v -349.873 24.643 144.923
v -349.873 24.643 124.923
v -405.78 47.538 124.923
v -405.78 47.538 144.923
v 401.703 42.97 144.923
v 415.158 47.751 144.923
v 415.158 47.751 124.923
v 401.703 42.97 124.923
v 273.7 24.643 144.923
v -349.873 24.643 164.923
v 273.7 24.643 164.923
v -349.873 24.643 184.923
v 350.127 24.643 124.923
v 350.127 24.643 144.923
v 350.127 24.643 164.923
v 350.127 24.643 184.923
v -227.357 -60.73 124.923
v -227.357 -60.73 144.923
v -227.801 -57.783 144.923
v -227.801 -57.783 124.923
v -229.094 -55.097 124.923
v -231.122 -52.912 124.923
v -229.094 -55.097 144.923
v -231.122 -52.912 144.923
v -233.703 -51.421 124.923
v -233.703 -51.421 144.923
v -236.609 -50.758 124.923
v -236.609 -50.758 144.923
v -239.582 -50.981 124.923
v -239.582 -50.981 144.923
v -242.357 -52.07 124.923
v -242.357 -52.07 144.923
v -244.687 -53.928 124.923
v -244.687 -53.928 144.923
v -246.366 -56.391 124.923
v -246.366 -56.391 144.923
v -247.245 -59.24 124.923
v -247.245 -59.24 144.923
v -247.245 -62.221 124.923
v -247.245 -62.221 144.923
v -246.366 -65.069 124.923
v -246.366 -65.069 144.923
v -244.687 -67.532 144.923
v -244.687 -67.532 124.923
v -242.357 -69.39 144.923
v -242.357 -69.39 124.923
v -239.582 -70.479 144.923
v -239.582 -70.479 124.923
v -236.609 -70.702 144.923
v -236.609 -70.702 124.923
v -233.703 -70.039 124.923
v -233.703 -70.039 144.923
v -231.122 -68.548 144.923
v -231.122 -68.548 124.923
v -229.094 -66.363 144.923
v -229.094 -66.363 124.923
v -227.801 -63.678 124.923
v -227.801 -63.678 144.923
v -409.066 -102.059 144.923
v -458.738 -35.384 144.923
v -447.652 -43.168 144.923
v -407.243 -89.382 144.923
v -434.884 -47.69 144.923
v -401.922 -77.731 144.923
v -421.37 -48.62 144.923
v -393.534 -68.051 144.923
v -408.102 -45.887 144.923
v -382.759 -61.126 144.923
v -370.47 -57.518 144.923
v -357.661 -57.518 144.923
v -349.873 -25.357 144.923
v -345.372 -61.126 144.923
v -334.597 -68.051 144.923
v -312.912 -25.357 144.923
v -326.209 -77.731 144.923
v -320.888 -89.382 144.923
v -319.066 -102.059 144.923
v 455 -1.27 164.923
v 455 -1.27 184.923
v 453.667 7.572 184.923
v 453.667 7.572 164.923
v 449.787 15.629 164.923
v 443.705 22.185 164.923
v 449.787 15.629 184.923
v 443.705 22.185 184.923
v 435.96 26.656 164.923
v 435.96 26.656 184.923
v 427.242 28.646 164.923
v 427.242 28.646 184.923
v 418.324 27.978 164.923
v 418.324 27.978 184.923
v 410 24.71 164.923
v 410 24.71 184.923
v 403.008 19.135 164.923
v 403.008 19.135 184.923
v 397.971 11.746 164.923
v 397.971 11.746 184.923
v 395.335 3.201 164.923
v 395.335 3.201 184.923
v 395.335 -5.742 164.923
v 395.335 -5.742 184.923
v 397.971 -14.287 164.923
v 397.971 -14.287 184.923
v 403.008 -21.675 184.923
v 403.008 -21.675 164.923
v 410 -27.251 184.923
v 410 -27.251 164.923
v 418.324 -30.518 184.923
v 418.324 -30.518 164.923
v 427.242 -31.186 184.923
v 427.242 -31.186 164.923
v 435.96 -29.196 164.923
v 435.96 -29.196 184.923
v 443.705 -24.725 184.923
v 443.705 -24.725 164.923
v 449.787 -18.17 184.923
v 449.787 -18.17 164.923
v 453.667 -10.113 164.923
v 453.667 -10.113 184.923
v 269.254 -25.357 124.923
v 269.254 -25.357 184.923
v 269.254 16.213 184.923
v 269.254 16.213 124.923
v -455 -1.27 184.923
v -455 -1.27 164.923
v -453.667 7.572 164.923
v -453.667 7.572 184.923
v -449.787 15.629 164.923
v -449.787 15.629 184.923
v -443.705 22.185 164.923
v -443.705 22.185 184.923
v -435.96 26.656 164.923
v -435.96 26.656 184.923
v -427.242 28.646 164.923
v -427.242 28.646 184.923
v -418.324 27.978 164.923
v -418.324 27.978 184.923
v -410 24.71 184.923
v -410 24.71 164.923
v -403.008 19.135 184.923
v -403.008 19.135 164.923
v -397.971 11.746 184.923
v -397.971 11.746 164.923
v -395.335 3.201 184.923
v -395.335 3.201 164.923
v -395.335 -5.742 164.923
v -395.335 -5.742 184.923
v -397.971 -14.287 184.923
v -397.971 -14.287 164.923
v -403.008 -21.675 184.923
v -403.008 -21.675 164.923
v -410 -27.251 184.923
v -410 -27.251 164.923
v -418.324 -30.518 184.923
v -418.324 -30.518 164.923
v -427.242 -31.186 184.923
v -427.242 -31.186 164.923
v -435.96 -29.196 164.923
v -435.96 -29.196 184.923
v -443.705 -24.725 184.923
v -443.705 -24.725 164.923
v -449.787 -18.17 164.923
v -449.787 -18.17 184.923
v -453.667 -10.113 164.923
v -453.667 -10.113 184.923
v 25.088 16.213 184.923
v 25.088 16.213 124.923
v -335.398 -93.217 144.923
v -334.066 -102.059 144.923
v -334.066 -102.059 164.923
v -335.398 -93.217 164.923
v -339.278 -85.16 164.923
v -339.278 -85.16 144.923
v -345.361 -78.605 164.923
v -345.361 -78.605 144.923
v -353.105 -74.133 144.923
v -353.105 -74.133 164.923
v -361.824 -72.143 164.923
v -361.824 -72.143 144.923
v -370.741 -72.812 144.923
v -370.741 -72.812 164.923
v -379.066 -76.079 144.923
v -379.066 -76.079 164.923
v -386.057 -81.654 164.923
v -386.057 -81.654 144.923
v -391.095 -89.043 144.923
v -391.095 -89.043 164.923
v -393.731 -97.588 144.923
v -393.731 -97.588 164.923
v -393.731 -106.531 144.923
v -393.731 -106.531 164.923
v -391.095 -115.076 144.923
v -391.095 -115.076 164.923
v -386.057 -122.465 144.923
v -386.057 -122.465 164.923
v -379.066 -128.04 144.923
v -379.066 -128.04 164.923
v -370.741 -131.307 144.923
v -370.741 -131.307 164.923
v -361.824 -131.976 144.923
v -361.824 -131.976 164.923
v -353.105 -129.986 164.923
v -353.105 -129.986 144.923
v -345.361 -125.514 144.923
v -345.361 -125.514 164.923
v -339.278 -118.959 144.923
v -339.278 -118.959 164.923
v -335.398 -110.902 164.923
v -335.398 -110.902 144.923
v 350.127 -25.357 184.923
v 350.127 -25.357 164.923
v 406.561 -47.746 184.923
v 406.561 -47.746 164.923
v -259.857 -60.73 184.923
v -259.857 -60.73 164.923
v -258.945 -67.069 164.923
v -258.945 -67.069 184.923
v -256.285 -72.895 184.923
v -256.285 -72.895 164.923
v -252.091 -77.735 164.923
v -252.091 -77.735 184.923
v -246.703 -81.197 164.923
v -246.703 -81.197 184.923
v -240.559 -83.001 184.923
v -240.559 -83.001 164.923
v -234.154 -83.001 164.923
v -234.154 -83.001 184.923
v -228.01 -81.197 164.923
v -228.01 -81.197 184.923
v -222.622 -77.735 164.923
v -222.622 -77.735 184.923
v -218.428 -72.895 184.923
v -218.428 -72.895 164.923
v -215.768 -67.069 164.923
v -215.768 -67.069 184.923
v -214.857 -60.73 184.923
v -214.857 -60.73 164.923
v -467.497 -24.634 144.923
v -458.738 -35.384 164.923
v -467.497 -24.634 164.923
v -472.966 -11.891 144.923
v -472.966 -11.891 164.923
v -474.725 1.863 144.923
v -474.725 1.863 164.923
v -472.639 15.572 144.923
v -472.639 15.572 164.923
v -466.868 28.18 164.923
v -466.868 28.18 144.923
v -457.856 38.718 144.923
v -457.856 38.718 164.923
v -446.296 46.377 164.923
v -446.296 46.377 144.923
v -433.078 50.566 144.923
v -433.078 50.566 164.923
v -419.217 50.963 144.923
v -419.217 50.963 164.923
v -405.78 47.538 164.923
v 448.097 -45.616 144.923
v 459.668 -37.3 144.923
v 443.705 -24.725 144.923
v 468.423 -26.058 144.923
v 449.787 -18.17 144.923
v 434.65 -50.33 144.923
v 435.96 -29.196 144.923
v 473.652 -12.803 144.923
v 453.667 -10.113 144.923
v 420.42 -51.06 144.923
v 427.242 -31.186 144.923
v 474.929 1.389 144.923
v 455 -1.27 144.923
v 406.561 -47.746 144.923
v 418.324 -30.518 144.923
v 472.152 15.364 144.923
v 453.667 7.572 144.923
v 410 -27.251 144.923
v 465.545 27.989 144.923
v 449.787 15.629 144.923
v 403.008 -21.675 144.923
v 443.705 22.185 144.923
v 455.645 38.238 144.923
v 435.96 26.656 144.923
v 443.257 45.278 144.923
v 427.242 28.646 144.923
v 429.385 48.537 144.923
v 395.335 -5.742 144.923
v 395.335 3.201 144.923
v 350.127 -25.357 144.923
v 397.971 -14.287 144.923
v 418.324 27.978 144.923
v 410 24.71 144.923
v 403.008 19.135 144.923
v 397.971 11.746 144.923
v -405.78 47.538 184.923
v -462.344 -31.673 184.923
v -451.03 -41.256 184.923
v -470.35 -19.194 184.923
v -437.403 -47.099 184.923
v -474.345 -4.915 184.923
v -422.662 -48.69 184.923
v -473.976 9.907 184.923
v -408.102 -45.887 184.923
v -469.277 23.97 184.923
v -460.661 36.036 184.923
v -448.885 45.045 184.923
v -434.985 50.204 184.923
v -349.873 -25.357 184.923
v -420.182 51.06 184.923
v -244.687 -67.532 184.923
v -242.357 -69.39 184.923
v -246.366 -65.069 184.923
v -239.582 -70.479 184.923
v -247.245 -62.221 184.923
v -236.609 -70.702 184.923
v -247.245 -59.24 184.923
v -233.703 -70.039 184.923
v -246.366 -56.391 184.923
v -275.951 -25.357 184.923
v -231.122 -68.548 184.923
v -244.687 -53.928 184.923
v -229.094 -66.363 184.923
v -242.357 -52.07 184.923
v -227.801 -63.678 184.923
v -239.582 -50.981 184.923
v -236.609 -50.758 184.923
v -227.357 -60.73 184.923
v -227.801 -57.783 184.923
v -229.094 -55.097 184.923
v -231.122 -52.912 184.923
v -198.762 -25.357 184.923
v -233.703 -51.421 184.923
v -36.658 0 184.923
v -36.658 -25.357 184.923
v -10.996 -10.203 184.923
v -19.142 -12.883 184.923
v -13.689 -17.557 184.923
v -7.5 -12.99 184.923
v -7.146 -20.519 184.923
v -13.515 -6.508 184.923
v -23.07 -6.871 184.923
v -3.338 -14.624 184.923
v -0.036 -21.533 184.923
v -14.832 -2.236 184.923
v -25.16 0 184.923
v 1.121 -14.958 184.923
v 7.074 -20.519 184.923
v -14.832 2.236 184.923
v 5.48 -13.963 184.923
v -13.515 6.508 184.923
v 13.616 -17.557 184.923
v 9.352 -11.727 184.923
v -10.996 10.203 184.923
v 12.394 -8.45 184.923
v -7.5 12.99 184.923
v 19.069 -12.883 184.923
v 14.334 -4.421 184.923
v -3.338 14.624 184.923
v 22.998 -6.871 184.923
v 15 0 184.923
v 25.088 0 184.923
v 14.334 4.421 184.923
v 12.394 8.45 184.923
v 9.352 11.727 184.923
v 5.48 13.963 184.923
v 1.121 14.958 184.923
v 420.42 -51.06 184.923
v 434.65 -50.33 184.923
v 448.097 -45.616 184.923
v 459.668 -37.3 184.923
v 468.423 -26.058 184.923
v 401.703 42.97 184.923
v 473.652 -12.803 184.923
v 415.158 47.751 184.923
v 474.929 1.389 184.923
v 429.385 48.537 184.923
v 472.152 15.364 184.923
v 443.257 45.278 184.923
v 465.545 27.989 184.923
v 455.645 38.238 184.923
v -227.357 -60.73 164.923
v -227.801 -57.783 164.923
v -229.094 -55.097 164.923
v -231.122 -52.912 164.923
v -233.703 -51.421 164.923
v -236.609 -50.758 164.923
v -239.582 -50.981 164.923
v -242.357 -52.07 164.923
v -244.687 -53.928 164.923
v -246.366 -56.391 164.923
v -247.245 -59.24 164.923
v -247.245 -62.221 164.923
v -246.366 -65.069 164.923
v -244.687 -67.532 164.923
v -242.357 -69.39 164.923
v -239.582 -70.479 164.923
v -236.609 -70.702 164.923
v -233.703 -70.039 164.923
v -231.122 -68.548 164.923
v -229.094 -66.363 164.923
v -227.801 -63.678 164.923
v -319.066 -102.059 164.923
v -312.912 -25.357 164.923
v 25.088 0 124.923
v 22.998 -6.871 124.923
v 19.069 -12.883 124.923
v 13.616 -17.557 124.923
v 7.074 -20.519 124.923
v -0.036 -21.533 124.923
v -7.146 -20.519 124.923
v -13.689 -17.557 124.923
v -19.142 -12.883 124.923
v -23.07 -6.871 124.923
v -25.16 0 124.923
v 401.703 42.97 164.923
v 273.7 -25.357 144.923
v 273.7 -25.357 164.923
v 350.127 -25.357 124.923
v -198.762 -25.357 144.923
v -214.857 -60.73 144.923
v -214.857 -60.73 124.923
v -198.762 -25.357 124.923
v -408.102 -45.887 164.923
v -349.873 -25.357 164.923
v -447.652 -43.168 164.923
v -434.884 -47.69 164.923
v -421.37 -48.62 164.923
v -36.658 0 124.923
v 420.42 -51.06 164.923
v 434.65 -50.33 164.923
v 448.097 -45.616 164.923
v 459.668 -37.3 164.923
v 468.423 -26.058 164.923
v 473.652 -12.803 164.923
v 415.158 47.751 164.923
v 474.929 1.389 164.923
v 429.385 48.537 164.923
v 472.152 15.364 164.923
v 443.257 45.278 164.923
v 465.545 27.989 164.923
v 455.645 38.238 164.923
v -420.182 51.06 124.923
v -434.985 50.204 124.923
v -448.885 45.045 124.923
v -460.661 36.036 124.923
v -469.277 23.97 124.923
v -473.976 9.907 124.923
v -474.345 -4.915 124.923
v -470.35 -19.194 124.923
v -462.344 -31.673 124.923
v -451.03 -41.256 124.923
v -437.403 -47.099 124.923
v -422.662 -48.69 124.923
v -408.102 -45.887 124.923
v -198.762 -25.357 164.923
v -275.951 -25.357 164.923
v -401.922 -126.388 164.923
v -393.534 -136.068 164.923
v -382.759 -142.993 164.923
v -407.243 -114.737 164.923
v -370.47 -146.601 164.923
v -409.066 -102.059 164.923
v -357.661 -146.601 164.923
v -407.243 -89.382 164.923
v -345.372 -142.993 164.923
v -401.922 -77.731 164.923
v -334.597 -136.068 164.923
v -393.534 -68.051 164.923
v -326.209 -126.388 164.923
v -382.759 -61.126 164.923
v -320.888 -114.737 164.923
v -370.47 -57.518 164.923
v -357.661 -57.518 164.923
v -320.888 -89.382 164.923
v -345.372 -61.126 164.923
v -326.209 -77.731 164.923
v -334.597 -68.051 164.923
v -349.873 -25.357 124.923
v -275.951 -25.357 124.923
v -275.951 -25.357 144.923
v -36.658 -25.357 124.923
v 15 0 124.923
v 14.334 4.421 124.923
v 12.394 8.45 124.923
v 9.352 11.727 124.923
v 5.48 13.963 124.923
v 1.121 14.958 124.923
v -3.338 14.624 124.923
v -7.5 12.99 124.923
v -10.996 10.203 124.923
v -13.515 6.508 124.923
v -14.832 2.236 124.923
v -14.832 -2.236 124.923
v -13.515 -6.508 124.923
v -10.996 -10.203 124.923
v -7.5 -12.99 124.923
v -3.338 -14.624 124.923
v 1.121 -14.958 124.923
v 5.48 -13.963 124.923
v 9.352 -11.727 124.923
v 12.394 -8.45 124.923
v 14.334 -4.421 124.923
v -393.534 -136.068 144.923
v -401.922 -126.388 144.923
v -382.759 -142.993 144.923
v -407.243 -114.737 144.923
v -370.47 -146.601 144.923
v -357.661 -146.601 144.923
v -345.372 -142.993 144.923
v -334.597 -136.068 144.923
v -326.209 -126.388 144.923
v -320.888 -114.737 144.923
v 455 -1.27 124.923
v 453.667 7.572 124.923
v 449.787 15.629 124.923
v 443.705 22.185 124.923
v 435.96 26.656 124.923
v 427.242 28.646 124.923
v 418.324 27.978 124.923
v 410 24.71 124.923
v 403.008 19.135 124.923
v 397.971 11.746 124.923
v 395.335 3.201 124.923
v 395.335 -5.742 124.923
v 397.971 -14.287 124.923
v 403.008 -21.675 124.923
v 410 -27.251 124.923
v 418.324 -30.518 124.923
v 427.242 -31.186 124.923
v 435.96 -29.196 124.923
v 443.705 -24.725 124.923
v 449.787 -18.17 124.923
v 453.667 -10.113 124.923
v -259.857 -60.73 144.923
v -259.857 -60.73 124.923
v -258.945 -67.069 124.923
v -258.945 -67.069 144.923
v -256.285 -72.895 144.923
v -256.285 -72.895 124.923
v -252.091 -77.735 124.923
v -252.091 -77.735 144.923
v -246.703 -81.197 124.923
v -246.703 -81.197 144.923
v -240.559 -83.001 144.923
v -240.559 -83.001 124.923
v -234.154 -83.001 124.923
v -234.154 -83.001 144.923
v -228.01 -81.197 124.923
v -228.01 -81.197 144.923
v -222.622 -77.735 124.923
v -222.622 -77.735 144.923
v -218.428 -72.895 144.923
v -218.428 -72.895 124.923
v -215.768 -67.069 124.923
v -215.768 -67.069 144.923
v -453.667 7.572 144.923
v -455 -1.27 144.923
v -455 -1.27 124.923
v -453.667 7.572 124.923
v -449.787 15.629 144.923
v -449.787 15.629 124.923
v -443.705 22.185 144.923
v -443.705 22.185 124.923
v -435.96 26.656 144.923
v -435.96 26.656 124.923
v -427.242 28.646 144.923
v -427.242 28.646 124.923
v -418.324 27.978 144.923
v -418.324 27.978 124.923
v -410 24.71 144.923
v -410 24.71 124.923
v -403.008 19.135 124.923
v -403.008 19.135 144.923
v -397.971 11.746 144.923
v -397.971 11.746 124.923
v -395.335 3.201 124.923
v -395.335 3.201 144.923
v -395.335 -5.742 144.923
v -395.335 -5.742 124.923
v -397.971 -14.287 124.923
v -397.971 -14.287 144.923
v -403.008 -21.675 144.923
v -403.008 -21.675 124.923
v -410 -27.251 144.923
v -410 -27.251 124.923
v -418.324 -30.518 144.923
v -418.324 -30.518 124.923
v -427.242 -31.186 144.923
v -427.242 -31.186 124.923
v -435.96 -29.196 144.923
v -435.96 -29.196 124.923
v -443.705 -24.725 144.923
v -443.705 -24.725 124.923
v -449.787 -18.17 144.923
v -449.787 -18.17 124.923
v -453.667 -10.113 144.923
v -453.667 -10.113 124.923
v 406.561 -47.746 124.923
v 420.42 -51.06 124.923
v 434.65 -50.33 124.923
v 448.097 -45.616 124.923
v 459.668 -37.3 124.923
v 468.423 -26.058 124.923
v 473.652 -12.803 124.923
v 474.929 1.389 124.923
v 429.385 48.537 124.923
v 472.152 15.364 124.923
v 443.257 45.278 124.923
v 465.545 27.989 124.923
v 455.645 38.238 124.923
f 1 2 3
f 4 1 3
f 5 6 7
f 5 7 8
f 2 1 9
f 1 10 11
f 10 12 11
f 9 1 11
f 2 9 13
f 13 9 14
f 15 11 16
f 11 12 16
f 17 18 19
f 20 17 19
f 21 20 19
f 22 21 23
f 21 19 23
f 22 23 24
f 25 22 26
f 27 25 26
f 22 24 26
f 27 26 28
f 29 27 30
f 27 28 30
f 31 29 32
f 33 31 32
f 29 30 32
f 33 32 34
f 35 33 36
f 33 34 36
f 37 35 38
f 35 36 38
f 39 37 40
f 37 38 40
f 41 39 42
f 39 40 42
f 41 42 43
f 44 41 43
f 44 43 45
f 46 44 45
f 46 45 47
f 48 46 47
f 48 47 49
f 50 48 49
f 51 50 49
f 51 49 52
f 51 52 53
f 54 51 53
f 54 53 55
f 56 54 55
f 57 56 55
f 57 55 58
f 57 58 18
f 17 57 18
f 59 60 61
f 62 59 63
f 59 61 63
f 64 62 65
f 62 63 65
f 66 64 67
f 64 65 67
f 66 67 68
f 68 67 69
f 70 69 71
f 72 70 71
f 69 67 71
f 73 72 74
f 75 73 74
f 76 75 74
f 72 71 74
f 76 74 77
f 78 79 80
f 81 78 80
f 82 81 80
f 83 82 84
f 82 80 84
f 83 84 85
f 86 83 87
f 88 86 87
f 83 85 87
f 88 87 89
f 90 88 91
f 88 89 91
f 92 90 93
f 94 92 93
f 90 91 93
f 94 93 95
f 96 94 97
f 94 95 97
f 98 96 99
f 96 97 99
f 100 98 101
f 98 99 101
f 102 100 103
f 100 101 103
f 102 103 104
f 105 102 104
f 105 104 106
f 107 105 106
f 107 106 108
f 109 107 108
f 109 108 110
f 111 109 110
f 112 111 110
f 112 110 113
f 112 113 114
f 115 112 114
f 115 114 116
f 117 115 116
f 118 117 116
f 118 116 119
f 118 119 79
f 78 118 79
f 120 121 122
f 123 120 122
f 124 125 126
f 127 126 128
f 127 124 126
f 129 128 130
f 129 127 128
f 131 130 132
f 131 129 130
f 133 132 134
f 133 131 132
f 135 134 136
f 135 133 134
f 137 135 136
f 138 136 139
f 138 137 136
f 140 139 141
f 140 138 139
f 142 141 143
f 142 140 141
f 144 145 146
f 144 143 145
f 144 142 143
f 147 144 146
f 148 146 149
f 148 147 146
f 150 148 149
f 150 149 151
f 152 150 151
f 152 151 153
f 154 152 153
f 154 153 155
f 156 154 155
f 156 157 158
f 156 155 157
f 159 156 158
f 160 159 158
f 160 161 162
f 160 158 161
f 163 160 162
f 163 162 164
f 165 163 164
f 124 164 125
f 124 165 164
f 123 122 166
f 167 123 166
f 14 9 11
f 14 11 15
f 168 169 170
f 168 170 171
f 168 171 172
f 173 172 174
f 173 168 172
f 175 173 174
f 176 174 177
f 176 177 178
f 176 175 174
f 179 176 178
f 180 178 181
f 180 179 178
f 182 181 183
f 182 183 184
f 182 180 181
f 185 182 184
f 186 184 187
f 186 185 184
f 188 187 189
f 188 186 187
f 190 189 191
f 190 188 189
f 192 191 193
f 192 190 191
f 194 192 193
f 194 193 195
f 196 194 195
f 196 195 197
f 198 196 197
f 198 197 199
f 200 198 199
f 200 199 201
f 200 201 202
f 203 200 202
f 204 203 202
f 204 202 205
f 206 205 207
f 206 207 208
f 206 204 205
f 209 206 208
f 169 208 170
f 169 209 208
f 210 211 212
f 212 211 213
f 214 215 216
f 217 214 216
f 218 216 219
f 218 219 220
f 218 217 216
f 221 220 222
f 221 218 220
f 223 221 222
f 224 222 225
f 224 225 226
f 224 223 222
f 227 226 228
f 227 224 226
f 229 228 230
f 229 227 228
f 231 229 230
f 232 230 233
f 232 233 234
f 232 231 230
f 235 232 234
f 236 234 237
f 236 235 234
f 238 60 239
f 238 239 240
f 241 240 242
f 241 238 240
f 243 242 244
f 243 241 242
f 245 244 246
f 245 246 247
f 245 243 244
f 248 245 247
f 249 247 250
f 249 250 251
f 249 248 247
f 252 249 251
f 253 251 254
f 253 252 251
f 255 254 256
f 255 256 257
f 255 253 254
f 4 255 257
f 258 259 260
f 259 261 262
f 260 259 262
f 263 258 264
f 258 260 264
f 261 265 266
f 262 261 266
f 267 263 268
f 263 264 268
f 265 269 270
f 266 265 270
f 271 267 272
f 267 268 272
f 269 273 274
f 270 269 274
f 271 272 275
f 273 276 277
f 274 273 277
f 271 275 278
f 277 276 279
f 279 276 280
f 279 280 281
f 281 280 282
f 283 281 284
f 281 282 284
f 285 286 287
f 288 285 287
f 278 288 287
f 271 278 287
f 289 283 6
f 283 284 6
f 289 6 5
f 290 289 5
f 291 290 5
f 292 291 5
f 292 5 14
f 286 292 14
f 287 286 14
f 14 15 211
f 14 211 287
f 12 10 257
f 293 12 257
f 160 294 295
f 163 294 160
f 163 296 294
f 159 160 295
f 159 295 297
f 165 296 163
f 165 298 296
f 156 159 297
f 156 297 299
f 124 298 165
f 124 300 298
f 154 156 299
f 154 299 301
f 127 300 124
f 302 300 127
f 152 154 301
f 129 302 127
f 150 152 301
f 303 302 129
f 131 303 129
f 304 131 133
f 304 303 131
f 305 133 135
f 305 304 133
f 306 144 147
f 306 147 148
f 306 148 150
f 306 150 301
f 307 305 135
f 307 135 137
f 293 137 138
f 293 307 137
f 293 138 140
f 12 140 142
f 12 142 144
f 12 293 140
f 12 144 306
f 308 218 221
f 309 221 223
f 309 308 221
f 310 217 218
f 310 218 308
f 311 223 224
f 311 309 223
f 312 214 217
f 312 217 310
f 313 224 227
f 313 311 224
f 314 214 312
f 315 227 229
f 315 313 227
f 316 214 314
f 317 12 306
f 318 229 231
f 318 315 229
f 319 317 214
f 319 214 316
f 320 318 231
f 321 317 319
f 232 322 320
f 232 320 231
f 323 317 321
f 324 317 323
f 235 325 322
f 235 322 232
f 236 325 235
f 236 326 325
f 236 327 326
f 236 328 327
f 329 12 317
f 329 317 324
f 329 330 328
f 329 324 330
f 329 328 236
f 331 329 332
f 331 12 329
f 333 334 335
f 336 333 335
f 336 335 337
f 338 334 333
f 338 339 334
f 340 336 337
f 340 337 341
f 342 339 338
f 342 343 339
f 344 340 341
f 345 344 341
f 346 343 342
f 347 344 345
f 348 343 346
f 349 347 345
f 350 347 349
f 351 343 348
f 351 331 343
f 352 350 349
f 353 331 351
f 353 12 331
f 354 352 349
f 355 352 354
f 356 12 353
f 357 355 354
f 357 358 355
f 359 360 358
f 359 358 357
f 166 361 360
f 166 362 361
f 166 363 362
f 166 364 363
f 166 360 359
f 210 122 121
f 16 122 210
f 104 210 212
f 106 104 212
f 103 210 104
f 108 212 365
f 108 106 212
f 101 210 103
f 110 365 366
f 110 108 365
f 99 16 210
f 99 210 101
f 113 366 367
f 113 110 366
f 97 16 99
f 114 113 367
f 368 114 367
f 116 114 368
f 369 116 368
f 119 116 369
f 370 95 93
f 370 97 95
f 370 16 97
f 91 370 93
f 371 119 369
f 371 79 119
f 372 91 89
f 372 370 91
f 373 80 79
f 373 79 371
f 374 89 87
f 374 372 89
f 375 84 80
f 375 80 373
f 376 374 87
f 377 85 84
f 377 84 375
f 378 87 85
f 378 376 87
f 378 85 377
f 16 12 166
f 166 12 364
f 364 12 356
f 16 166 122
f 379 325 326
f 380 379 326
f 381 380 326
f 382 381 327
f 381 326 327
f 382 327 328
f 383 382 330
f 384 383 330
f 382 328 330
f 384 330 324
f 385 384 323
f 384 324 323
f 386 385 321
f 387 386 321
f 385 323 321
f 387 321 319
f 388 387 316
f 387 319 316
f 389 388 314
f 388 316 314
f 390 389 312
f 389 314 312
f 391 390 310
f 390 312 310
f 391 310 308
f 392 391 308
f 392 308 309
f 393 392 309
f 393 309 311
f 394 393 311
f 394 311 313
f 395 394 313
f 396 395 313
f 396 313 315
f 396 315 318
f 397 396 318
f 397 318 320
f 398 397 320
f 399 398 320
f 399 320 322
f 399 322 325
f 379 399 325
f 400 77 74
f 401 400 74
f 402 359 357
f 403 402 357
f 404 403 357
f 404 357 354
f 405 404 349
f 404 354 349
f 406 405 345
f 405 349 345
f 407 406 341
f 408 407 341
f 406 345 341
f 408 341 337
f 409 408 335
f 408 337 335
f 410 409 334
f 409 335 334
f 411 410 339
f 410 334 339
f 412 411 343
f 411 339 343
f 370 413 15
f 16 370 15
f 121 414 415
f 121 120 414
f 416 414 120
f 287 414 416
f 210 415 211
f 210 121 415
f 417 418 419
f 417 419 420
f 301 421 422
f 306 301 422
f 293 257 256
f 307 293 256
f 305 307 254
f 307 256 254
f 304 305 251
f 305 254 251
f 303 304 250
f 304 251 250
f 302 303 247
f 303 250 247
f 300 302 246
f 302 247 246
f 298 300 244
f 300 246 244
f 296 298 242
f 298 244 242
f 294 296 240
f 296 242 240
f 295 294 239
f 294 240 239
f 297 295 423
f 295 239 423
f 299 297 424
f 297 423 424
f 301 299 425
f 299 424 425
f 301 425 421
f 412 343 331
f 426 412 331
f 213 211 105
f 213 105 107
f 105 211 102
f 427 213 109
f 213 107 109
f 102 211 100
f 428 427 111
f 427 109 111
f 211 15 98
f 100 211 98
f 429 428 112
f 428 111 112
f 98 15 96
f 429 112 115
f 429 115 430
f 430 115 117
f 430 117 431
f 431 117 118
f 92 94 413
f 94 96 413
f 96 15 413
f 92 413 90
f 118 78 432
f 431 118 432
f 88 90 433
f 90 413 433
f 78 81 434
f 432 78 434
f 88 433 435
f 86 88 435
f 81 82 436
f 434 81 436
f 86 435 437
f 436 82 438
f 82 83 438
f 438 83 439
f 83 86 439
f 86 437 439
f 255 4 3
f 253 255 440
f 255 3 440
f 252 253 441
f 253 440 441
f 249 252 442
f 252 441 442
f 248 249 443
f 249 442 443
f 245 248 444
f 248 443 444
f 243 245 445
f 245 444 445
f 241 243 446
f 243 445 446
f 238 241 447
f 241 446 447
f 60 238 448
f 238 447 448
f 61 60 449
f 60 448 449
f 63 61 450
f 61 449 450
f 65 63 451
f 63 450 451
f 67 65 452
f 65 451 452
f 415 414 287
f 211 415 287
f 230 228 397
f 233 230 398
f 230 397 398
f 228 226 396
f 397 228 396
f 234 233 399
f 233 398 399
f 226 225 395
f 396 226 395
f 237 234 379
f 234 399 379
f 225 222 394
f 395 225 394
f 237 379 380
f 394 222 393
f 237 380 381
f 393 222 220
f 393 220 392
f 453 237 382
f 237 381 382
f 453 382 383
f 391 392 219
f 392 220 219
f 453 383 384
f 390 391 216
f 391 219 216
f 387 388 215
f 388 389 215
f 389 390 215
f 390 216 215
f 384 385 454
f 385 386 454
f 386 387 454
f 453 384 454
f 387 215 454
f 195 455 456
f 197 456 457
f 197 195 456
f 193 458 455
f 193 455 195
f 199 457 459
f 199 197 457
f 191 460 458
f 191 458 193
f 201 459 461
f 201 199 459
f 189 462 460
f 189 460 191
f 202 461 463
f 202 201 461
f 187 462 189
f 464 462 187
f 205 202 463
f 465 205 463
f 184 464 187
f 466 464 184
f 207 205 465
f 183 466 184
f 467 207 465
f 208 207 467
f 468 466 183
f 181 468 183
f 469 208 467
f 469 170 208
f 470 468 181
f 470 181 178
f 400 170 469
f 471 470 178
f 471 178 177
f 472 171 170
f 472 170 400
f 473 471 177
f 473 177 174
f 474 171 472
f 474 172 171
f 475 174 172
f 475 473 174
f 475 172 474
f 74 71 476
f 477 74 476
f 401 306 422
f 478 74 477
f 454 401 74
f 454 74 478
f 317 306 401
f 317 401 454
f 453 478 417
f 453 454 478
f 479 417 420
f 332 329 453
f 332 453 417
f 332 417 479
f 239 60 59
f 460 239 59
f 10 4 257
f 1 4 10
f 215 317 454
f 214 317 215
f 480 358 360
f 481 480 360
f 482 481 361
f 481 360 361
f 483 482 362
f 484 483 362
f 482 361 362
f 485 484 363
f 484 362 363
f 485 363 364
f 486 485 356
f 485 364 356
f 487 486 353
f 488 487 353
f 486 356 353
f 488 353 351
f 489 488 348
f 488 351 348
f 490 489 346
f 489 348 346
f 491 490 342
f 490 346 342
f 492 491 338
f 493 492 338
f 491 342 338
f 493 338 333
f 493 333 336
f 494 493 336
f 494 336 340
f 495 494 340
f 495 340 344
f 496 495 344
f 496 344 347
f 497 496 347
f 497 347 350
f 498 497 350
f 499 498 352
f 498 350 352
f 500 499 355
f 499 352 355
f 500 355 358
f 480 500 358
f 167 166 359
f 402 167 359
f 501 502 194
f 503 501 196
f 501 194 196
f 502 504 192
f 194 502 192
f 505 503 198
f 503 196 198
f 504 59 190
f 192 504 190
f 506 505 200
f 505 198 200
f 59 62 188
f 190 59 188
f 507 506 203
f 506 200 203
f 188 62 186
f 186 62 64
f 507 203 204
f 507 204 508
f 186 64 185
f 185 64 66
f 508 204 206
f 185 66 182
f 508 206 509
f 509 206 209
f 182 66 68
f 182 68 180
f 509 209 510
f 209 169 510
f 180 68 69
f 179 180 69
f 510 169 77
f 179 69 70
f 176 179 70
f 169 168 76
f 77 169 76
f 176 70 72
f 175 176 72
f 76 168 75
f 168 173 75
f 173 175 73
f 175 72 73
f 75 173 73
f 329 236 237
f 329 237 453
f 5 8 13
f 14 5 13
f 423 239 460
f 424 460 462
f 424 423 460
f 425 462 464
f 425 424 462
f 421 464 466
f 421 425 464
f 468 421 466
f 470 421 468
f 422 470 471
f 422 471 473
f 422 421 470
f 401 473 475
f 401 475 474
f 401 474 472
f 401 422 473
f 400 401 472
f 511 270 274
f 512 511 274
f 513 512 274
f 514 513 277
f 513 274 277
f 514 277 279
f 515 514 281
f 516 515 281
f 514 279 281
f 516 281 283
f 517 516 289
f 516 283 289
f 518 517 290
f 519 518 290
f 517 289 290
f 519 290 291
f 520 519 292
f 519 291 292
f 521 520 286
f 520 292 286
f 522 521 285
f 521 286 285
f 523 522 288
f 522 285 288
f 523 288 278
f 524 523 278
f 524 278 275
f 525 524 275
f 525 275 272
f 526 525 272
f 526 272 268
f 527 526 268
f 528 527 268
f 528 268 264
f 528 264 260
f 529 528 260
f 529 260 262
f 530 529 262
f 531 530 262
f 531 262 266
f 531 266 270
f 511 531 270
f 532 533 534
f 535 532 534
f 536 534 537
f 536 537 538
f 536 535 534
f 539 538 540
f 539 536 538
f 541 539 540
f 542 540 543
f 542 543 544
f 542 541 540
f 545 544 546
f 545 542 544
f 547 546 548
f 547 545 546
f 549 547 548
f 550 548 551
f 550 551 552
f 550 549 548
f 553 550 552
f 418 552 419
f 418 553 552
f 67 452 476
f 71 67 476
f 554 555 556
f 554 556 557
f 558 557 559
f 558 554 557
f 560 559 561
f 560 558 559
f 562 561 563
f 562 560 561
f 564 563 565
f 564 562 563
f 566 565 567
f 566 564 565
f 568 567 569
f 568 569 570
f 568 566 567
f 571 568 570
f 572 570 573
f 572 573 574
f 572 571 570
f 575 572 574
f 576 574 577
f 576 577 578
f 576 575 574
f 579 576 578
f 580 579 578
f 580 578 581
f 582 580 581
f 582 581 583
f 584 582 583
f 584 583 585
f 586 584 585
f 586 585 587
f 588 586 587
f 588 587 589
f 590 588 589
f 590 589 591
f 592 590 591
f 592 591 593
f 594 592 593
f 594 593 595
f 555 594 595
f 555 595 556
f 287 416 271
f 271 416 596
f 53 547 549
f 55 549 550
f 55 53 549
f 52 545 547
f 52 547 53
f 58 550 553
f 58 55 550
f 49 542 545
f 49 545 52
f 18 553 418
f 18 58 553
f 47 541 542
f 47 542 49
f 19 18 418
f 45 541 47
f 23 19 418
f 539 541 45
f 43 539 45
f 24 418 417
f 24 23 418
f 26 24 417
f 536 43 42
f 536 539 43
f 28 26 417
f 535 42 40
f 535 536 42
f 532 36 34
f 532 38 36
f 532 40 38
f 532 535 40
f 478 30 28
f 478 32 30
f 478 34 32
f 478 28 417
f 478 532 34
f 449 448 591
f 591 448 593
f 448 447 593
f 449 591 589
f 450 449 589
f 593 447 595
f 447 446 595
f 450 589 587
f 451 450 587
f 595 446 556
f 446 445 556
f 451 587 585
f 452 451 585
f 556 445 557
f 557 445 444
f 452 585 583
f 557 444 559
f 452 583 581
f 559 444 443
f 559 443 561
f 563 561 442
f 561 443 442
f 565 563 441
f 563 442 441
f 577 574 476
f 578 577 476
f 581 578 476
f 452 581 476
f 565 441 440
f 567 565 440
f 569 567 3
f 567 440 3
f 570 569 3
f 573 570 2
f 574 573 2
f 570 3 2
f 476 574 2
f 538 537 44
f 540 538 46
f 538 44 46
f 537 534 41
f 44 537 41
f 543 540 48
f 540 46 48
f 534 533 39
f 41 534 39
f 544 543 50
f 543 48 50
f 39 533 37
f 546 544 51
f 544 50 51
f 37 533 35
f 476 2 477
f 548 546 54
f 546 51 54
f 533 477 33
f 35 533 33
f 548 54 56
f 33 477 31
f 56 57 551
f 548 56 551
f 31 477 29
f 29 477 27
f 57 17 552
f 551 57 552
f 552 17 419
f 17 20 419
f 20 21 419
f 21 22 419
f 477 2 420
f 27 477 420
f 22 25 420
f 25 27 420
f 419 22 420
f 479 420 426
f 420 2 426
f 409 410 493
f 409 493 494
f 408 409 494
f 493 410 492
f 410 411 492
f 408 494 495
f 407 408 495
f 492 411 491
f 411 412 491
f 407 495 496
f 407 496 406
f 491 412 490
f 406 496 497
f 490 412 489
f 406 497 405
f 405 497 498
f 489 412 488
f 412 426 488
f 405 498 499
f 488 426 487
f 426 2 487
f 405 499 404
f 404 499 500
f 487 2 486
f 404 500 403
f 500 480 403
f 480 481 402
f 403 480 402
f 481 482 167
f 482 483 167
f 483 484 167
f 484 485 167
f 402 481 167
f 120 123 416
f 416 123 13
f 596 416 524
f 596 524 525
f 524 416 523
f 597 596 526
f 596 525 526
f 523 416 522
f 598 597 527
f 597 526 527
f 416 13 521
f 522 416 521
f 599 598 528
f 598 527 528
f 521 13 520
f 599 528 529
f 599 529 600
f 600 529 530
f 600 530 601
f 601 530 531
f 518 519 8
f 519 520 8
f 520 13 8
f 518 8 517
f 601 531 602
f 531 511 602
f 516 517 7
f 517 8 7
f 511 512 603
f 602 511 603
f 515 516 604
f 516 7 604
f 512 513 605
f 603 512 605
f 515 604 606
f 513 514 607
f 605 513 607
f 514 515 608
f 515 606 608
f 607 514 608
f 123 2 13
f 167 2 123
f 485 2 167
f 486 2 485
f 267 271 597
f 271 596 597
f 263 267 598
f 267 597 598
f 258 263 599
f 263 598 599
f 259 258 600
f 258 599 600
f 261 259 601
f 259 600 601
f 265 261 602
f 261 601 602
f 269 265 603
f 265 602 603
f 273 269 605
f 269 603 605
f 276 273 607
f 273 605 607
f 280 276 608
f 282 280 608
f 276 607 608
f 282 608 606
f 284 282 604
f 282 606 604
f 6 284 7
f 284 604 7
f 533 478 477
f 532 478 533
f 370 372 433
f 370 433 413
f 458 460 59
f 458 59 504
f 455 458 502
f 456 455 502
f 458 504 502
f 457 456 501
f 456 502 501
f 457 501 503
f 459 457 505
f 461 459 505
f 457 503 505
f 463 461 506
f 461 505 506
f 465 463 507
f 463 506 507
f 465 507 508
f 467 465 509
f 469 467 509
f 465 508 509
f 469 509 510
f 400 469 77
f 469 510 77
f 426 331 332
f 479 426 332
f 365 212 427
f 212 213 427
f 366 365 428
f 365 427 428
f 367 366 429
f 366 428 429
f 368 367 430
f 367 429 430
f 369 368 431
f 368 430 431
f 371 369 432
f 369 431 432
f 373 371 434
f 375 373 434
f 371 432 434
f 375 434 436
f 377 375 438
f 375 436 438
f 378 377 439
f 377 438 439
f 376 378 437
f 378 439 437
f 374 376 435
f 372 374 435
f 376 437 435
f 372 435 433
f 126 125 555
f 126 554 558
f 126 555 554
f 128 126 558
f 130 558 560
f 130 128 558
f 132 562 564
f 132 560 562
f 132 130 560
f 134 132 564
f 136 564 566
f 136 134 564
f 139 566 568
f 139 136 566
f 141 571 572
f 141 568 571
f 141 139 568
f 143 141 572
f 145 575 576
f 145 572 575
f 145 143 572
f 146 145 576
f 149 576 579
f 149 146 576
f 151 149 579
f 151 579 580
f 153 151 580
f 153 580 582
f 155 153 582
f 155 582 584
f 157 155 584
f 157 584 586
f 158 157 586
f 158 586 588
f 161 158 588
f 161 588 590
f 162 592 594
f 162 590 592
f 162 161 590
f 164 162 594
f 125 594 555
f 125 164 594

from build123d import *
from build123d.topology import SkipClean

# Parameters (mm, degrees)
BOSS_EXTRUDE1_DEPTH  = 300
SKETCH2_OUTSIDE_W    = 1151.978
SKETCH2_OUTSIDE_H    = 502.25
CUT_EXTRUDE1_DEPTH   = 1000
SKETCH31_OUTSIDE_W   = 1151.978
SKETCH31_OUTSIDE_H   = 502.25
CUT_EXTRUDE13_DEPTH  = 250
CUT_EXTRUDE14_REACH  = 483.512
SKETCH33_R           = 30
SKETCH34_W           = 75.804148239
SKETCH34_H           = 20
BOSS_EXTRUDE8_DEPTH  = 50
SKETCH36_R           = 22.5
SKETCH36_R_2         = 10
BOSS_EXTRUDE9_DEPTH  = 60
SKETCH37_R           = 15
CUT_EXTRUDE15_DEPTH  = 60
SKETCH40_W           = 20
SKETCH40_H           = 60.662429819
CUT_EXTRUDE16_DEPTH  = 190
BOSS_EXTRUDE10_START = 20
BOSS_EXTRUDE10_DEPTH = 20
CUT_EXTRUDE17_START  = -190
SKETCH42_R           = 30
CUT_EXTRUDE17_DEPTH  = 190
SKETCH43_R           = 45
SKETCH43_R_2         = 30
BOSS_EXTRUDE11_DEPTH = 20
SKETCH16_W           = 76.426632505
SKETCH16_H           = 20
BOSS_EXTRUDE5_DEPTH  = 50
CUT_EXTRUDE18_DEPTH  = 60


with BuildPart() as part:
    # Sketch1 → Boss-Extrude1 (new body)
    with BuildSketch(Plane.XY):
        with BuildLine():
            Line((350.126678984, 24.643496119), (-349.873321016, 24.643496119))
            Line((-349.873321016, 24.643496119), (-405.7801007, 47.538028277))
            ThreePointArc((-405.7801007, 47.538028277), (-474.713018176, 2.509970806), (-408.102340797, -45.887247404))
            Line((-408.102340797, -45.887247404), (-349.873321016, -25.356503881))
            Line((-349.873321016, -25.356503881), (350.126678984, -25.356503881))
            Line((350.126678984, -25.356503881), (406.56125394, -47.746215249))
            ThreePointArc((406.56125394, -47.746215249), (474.7986376, -5.753101083), (415.157857426, 47.751473547))
            Line((415.157857426, 47.751473547), (401.702587644, 42.970319678))
            Line((401.702587644, 42.970319678), (350.126678984, 24.643496119))
        make_face()
    extrude(amount=BOSS_EXTRUDE1_DEPTH)

    # Sketch2 outside → Cut-Extrude1 (cut)
    with BuildSketch(Plane(origin=(0, 24.643496119, 0), x_dir=(1, 0, 0), z_dir=(0, 1, 0))):
        with Locations((0.136, -150)):
            Rectangle(SKETCH2_OUTSIDE_W, SKETCH2_OUTSIDE_H)
        Polygon((475, -124.923454888), (350.126678984, -124.923454888), (273.700046479, -124.923454888), (-0.184563149, -124.923454888), (-274.069172777, -124.923454888), (-349.873321016, -124.923454888), (-474.728457358, -124.923454888), (-474.728457358, -144.923454888), (-349.873321016, -144.923454888), (-274.069172777, -144.923454888), (-274.069172777, -164.923454888), (-349.873321016, -164.923454888), (-474.728457358, -164.923454888), (-474.728457358, -184.923454888), (-349.873321016, -184.923454888), (-274.069172777, -184.923454888), (273.700046479, -184.923454888), (350.126678984, -184.923454888), (479.145365595, -184.923454888), (479.145365595, -164.923454888), (350.126678984, -164.923454888), (273.700046479, -164.923454888), (273.700046479, -144.923454888), (350.126678984, -144.923454888), (475, -144.923454888), align=None, mode=Mode.SUBTRACT)
    extrude(amount=-CUT_EXTRUDE1_DEPTH, mode=Mode.SUBTRACT)

    # Sketch31 outside → Cut-Extrude13 (cut, symmetric)
    with BuildSketch(Plane(origin=(0, 24.643496119, 0), x_dir=(1, 0, 0), z_dir=(0, 1, 0))):
        with Locations((0.136, -150)):
            Rectangle(SKETCH31_OUTSIDE_W, SKETCH31_OUTSIDE_H)
        Polygon((-474.728457358, -124.923454888), (475, -124.923454888), (475, -144.923454888), (273.700046479, -144.923454888), (273.700046479, -164.923454888), (475, -164.923454888), (475, -184.923454888), (-474.728457358, -184.923454888), (-474.728457358, -164.923454888), (-274.069172777, -164.923454888), (-274.069172777, -144.923454888), (-474.728457358, -144.923454888), align=None, mode=Mode.SUBTRACT)
    extrude(amount=CUT_EXTRUDE13_DEPTH, both=True, mode=Mode.SUBTRACT)

    # Cut-Extrude14: up to this face of the body (flat: up to its plane)
    cut_extrude14_end = Plane(part.part.faces().sort_by_distance((0.002005982, -0.266752761, 124.923454888))[0])
    # Sketch33 → Cut-Extrude14 (cut, up to the picked face)
    with BuildSketch(Plane.XY.offset(184.923454888), mode=Mode.PRIVATE) as cut_extrude14_sk1:
        with Locations((425, -1.27027907)):
            Circle(SKETCH33_R)
    cut_extrude14_tool1 = split(extrude(cut_extrude14_sk1.sketch, amount=-CUT_EXTRUDE14_REACH, mode=Mode.PRIVATE), bisect_by=cut_extrude14_end, keep=Keep.BOTH, mode=Mode.PRIVATE)
    cut_extrude14 = cut_extrude14_tool1.solids().sort_by(Axis((425, -1.270279, 184.923455), (0, 0, -1)))[0]
    add(cut_extrude14, mode=Mode.SUBTRACT)

    # Mirror2: Cut-Extrude14 across plane
    add(cut_extrude14.mirror(Plane(origin=(0, 0, 0), x_dir=(0, 0, 1), z_dir=(1, 0, 0))), mode=Mode.SUBTRACT)

    # Sketch34 → Boss-Extrude8 (add)
    with BuildSketch(Plane.XZ.offset(25.356503881)):
        with Locations((-311.971246897, 154.923454888)):
            Rectangle(SKETCH34_W, SKETCH34_H)
    extrude(amount=-BOSS_EXTRUDE8_DEPTH)

    # Sketch36 → Boss-Extrude9 (add)
    # profile 1 of 2: a face of its own
    with BuildSketch(Plane.XY.offset(184.923454888)):
        with BuildLine():
            Line((-198.76239189, -25.356503881), (-275.950626286, -25.356503881))
            Line((-275.950626286, -25.356503881), (-259.856509088, -60.730156187))
            ThreePointArc((-259.856509088, -60.730156187), (-237.356509088, -38.230156187), (-214.856509088, -60.730156187))
            Line((-214.856509088, -60.730156187), (-198.76239189, -25.356503881))
        make_face()
    # profile 2 of 2: a face of its own
    with BuildSketch(Plane.XY.offset(184.923454888)):
        with Locations((-237.356509088, -60.730156187)):
            Circle(SKETCH36_R)
        with Locations((-237.356509088, -60.730156187)):
            Circle(SKETCH36_R_2, mode=Mode.SUBTRACT)
    extrude(amount=-BOSS_EXTRUDE9_DEPTH)

    # Sketch37 → Cut-Extrude15 (cut)
    with BuildSketch(Plane.XY.offset(184.923454888)):
        Circle(SKETCH37_R)
    extrude(amount=-CUT_EXTRUDE15_DEPTH, mode=Mode.SUBTRACT)

    # Sketch40 → Cut-Extrude16 (cut)
    with BuildSketch(Plane.ZY.offset(349.873321016)):
        with Locations((154.923454888, -55.68771879)):
            Rectangle(SKETCH40_W, SKETCH40_H)
    extrude(amount=-CUT_EXTRUDE16_DEPTH, mode=Mode.SUBTRACT)

    # Sketch41 → Boss-Extrude10 (add)
    with SkipClean():  # the faces are left unmerged after this step: merging them gives an invalid solid
        with BuildSketch(Plane(origin=(0, 0, 164.923454888), x_dir=(-1, 0, 0), z_dir=(0, 0, -1)).offset(BOSS_EXTRUDE10_START)):
            with BuildLine():
                Line((349.873321016, 24.643496119), (349.873321016, -25.356503881))
                Line((349.873321016, -25.356503881), (408.102340797, -45.887247404))
                ThreePointArc((408.102340797, -45.887247404), (474.713018176, 2.509970806), (405.7801007, 47.538028277))
                Line((405.7801007, 47.538028277), (349.873321016, 24.643496119))
            make_face()
        extrude(amount=-BOSS_EXTRUDE10_DEPTH)

    # Sketch42 → Cut-Extrude17 (cut)
    with SkipClean():  # the faces are left unmerged after this step: merging them gives an invalid solid
        with BuildSketch(Plane(origin=(0, 0, 144.923454888), x_dir=(-1, 0, 0), z_dir=(0, 0, -1)).offset(CUT_EXTRUDE17_START)):
            with Locations((425, -1.27027907)):
                Circle(SKETCH42_R)
        extrude(amount=CUT_EXTRUDE17_DEPTH, mode=Mode.SUBTRACT)

    # Sketch43 → Boss-Extrude11 (add)
    # profile 1 of 2: a face of its own
    with SkipClean():  # the faces are left unmerged after this step: merging them gives an invalid solid
        with BuildSketch(Plane.XY.offset(144.923454888)):
            with BuildLine():
                ThreePointArc((-408.102340797, -45.887247404), (-434.883748111, -47.690318028), (-458.738421585, -35.383840268))
                Line((-458.738421585, -35.383840268), (-409.065603299, -102.059498008))
                ThreePointArc((-409.065603299, -102.059498008), (-364.065603299, -57.059498008), (-319.065603299, -102.059498008))
                Line((-319.065603299, -102.059498008), (-312.911973651, -25.356503881))
                Line((-312.911973651, -25.356503881), (-349.873321016, -25.356503881))
                Line((-349.873321016, -25.356503881), (-408.102340797, -45.887247404))
            make_face()
        # profile 2 of 2: a face of its own
        with BuildSketch(Plane.XY.offset(144.923454888)):
            with Locations((-364.065603299, -102.059498008)):
                Circle(SKETCH43_R)
            with Locations((-364.065603299, -102.059498008)):
                Circle(SKETCH43_R_2, mode=Mode.SUBTRACT)
        extrude(amount=BOSS_EXTRUDE11_DEPTH)

    # Sketch16 → Boss-Extrude5 (add)
    with SkipClean():  # the faces are left unmerged after this step: merging them gives an invalid solid
        with BuildSketch(Plane(origin=(0, 24.643496119, 0), x_dir=(1, 0, 0), z_dir=(0, 1, 0))):
            with Locations((311.913362732, -154.923454888)):
                Rectangle(SKETCH16_W, SKETCH16_H)
        extrude(amount=-BOSS_EXTRUDE5_DEPTH)

    # Sketch44 → Cut-Extrude18 (cut)
    with SkipClean():  # the faces are left unmerged after this step: merging them gives an invalid solid
        with BuildSketch(Plane.XY.offset(184.923454888)):
            with BuildLine():
                Line((-25.160479447, 0), (-36.658076152, 0))
                Line((-36.658076152, 0), (-36.658076152, -25.356503881))
                Line((-36.658076152, -25.356503881), (269.253650874, -25.356503881))
                Line((269.253650874, -25.356503881), (269.253650874, 16.212961512))
                Line((269.253650874, 16.212961512), (25.088276522, 16.212961512))
                Line((25.088276522, 16.212961512), (25.088276522, 0))
                ThreePointArc((25.088276522, 0), (-0.036101462, -21.533407162), (-25.160479447, 0))
            make_face()
        extrude(amount=-CUT_EXTRUDE18_DEPTH, mode=Mode.SUBTRACT)


solid = part.part
